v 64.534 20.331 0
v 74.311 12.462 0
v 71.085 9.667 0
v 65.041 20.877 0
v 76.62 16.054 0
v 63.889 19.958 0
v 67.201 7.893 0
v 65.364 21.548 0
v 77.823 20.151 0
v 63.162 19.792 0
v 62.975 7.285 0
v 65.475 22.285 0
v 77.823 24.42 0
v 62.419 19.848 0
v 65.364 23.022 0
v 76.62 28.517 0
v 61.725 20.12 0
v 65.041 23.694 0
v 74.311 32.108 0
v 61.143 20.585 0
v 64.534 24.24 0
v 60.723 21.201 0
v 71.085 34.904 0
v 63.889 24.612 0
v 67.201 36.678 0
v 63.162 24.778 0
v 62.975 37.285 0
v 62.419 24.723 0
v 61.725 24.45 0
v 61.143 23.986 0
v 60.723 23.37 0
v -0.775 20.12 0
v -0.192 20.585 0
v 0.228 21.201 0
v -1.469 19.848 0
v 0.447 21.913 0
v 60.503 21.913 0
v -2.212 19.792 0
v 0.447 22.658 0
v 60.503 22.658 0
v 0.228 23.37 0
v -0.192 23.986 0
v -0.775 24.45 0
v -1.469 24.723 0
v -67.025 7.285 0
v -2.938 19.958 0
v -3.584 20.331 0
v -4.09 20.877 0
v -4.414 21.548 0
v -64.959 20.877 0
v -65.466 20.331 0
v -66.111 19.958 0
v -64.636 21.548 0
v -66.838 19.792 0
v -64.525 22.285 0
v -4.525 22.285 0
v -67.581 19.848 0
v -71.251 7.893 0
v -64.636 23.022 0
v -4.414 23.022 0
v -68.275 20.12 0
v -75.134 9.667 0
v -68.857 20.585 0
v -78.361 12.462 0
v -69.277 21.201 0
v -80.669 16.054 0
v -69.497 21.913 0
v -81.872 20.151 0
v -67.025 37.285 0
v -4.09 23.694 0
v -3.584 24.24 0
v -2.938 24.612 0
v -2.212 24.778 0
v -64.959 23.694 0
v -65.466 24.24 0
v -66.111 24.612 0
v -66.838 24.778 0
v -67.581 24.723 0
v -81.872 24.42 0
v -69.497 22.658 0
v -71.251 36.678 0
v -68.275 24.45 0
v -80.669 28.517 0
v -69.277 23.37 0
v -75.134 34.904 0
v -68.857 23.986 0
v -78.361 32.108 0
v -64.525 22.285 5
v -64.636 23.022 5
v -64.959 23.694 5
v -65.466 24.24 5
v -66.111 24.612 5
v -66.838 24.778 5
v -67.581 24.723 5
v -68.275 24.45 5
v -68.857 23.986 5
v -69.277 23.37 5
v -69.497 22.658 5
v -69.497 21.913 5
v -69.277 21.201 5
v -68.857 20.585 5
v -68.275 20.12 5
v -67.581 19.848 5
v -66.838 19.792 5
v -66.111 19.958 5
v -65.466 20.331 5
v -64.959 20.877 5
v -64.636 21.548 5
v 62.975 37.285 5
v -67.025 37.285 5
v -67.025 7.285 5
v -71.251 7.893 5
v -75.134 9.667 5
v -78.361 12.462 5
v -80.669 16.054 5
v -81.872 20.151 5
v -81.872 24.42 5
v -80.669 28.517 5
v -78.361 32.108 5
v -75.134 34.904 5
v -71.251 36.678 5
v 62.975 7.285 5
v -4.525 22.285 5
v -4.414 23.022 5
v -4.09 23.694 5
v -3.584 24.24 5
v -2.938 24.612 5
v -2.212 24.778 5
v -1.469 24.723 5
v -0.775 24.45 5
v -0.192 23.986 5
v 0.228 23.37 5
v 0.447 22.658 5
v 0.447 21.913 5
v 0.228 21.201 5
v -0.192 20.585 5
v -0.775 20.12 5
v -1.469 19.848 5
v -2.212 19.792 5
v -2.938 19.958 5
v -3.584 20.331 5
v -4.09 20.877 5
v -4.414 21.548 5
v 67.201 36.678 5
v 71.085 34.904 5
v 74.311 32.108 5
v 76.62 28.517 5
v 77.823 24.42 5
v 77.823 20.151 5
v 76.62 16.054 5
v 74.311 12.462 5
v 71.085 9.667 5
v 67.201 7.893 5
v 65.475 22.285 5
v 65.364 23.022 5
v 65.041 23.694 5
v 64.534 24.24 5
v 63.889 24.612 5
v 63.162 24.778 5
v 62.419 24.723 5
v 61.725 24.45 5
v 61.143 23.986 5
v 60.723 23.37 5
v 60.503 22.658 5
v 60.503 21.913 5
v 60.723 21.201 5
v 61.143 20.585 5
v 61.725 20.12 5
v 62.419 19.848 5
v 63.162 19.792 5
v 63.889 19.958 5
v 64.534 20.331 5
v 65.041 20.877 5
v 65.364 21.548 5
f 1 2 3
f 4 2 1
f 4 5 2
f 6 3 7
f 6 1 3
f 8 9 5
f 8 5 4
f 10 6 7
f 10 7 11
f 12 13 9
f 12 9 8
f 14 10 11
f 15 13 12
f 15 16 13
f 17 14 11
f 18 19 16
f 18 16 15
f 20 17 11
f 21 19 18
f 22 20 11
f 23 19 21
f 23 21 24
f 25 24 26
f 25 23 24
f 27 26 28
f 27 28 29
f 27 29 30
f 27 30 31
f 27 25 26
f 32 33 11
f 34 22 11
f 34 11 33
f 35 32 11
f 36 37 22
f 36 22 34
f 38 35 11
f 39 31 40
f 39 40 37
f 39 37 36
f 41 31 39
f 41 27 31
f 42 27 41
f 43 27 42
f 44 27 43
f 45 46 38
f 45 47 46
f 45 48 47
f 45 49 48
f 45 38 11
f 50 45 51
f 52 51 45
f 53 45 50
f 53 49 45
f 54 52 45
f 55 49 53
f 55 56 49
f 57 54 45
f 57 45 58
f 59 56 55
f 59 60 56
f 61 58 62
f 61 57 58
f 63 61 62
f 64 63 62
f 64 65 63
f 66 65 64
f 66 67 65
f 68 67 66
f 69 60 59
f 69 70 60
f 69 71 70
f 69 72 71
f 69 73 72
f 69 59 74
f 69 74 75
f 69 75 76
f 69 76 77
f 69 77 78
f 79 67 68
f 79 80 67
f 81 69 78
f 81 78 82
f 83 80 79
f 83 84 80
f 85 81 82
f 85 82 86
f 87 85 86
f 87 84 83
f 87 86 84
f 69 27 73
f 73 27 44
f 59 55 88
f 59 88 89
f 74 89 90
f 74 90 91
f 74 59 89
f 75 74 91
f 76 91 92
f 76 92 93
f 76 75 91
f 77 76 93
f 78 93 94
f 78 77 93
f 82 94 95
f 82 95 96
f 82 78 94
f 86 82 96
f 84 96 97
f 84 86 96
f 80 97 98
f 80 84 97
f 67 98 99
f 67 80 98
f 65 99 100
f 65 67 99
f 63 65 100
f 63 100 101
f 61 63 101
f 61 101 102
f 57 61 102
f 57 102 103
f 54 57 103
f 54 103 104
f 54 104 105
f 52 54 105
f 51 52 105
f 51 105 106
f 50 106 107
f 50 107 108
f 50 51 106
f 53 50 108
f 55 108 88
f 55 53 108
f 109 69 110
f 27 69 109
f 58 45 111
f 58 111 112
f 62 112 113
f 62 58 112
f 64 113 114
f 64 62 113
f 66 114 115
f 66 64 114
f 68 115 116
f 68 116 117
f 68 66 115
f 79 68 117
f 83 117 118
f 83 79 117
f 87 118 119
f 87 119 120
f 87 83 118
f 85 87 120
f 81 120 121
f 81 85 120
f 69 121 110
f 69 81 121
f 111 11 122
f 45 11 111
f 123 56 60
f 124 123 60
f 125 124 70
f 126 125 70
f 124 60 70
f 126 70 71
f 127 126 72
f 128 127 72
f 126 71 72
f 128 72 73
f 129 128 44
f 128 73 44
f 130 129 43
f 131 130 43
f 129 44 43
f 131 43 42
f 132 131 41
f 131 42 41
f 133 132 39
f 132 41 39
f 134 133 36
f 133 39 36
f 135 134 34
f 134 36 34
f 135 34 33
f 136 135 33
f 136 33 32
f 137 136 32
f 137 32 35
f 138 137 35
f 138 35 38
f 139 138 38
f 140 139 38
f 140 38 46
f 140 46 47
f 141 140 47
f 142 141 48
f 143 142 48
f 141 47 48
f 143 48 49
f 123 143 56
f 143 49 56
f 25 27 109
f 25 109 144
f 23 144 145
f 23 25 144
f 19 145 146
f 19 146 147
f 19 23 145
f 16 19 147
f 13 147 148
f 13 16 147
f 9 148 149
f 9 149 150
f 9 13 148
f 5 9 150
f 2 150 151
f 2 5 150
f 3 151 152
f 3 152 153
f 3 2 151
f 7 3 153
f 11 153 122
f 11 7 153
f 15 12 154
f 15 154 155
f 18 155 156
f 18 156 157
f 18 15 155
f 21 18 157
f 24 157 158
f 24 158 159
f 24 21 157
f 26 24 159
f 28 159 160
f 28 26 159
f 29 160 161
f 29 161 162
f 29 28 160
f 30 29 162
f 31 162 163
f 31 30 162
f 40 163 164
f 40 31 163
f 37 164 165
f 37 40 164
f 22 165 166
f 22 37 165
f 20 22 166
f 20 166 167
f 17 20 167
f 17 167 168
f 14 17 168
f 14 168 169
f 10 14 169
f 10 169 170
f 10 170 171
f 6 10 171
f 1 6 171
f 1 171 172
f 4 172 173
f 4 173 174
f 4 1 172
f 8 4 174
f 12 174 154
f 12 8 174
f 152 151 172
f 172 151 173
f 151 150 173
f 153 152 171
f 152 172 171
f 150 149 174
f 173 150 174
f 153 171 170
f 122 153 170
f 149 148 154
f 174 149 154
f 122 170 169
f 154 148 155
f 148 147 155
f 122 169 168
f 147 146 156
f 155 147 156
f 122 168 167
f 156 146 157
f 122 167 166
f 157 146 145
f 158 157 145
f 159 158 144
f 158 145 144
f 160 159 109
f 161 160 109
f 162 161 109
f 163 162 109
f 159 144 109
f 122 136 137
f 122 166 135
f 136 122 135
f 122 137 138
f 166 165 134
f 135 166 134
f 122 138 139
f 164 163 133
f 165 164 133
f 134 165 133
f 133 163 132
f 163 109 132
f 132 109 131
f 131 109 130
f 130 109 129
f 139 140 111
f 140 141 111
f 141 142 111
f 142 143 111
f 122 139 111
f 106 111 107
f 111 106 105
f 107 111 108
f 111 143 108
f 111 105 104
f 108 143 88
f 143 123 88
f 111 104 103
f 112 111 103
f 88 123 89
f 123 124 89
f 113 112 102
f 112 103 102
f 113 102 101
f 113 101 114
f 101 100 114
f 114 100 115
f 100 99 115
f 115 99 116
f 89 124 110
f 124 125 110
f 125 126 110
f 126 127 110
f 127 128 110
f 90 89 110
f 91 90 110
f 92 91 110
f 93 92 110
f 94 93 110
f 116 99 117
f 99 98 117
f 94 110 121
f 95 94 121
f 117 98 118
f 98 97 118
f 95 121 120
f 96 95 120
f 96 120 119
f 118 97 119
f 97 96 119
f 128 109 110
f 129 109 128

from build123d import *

# Parameters (mm, degrees)
SKETCH1_R           = 2.5
BOSS_EXTRUDE1_DEPTH = 5
SKETCH2_R           = 2.5
CUT_EXTRUDE1_DEPTH  = 5


with BuildPart() as part:
    # Sketch1 → Boss-Extrude1 (new body)
    with BuildSketch(Plane.XY):
        with BuildLine():
            Line((-67.024818312, 37.285306338), (62.975181688, 37.285306338))
            ThreePointArc((62.975181688, 37.285306338), (77.975181688, 22.285306338), (62.975181688, 7.285306338))
            Line((62.975181688, 7.285306338), (-67.024818312, 7.285306338))
            ThreePointArc((-67.024818312, 7.285306338), (-82.024818312, 22.285306338), (-67.024818312, 37.285306338))
        make_face()
        with Locations((-67.024818312, 22.285306338)):
            Circle(SKETCH1_R, mode=Mode.SUBTRACT)
        with Locations((62.975181688, 22.285306338)):
            Circle(SKETCH1_R, mode=Mode.SUBTRACT)
    extrude(amount=BOSS_EXTRUDE1_DEPTH)

    # Sketch2 → Cut-Extrude1 (cut)
    with BuildSketch(Plane(origin=(0, 0, 0), x_dir=(-1, 0, 0), z_dir=(0, 0, -1))):
        with Locations((2.024818312, 22.285306338)):
            Circle(SKETCH2_R)
    extrude(amount=-CUT_EXTRUDE1_DEPTH, mode=Mode.SUBTRACT)


solid = part.part
